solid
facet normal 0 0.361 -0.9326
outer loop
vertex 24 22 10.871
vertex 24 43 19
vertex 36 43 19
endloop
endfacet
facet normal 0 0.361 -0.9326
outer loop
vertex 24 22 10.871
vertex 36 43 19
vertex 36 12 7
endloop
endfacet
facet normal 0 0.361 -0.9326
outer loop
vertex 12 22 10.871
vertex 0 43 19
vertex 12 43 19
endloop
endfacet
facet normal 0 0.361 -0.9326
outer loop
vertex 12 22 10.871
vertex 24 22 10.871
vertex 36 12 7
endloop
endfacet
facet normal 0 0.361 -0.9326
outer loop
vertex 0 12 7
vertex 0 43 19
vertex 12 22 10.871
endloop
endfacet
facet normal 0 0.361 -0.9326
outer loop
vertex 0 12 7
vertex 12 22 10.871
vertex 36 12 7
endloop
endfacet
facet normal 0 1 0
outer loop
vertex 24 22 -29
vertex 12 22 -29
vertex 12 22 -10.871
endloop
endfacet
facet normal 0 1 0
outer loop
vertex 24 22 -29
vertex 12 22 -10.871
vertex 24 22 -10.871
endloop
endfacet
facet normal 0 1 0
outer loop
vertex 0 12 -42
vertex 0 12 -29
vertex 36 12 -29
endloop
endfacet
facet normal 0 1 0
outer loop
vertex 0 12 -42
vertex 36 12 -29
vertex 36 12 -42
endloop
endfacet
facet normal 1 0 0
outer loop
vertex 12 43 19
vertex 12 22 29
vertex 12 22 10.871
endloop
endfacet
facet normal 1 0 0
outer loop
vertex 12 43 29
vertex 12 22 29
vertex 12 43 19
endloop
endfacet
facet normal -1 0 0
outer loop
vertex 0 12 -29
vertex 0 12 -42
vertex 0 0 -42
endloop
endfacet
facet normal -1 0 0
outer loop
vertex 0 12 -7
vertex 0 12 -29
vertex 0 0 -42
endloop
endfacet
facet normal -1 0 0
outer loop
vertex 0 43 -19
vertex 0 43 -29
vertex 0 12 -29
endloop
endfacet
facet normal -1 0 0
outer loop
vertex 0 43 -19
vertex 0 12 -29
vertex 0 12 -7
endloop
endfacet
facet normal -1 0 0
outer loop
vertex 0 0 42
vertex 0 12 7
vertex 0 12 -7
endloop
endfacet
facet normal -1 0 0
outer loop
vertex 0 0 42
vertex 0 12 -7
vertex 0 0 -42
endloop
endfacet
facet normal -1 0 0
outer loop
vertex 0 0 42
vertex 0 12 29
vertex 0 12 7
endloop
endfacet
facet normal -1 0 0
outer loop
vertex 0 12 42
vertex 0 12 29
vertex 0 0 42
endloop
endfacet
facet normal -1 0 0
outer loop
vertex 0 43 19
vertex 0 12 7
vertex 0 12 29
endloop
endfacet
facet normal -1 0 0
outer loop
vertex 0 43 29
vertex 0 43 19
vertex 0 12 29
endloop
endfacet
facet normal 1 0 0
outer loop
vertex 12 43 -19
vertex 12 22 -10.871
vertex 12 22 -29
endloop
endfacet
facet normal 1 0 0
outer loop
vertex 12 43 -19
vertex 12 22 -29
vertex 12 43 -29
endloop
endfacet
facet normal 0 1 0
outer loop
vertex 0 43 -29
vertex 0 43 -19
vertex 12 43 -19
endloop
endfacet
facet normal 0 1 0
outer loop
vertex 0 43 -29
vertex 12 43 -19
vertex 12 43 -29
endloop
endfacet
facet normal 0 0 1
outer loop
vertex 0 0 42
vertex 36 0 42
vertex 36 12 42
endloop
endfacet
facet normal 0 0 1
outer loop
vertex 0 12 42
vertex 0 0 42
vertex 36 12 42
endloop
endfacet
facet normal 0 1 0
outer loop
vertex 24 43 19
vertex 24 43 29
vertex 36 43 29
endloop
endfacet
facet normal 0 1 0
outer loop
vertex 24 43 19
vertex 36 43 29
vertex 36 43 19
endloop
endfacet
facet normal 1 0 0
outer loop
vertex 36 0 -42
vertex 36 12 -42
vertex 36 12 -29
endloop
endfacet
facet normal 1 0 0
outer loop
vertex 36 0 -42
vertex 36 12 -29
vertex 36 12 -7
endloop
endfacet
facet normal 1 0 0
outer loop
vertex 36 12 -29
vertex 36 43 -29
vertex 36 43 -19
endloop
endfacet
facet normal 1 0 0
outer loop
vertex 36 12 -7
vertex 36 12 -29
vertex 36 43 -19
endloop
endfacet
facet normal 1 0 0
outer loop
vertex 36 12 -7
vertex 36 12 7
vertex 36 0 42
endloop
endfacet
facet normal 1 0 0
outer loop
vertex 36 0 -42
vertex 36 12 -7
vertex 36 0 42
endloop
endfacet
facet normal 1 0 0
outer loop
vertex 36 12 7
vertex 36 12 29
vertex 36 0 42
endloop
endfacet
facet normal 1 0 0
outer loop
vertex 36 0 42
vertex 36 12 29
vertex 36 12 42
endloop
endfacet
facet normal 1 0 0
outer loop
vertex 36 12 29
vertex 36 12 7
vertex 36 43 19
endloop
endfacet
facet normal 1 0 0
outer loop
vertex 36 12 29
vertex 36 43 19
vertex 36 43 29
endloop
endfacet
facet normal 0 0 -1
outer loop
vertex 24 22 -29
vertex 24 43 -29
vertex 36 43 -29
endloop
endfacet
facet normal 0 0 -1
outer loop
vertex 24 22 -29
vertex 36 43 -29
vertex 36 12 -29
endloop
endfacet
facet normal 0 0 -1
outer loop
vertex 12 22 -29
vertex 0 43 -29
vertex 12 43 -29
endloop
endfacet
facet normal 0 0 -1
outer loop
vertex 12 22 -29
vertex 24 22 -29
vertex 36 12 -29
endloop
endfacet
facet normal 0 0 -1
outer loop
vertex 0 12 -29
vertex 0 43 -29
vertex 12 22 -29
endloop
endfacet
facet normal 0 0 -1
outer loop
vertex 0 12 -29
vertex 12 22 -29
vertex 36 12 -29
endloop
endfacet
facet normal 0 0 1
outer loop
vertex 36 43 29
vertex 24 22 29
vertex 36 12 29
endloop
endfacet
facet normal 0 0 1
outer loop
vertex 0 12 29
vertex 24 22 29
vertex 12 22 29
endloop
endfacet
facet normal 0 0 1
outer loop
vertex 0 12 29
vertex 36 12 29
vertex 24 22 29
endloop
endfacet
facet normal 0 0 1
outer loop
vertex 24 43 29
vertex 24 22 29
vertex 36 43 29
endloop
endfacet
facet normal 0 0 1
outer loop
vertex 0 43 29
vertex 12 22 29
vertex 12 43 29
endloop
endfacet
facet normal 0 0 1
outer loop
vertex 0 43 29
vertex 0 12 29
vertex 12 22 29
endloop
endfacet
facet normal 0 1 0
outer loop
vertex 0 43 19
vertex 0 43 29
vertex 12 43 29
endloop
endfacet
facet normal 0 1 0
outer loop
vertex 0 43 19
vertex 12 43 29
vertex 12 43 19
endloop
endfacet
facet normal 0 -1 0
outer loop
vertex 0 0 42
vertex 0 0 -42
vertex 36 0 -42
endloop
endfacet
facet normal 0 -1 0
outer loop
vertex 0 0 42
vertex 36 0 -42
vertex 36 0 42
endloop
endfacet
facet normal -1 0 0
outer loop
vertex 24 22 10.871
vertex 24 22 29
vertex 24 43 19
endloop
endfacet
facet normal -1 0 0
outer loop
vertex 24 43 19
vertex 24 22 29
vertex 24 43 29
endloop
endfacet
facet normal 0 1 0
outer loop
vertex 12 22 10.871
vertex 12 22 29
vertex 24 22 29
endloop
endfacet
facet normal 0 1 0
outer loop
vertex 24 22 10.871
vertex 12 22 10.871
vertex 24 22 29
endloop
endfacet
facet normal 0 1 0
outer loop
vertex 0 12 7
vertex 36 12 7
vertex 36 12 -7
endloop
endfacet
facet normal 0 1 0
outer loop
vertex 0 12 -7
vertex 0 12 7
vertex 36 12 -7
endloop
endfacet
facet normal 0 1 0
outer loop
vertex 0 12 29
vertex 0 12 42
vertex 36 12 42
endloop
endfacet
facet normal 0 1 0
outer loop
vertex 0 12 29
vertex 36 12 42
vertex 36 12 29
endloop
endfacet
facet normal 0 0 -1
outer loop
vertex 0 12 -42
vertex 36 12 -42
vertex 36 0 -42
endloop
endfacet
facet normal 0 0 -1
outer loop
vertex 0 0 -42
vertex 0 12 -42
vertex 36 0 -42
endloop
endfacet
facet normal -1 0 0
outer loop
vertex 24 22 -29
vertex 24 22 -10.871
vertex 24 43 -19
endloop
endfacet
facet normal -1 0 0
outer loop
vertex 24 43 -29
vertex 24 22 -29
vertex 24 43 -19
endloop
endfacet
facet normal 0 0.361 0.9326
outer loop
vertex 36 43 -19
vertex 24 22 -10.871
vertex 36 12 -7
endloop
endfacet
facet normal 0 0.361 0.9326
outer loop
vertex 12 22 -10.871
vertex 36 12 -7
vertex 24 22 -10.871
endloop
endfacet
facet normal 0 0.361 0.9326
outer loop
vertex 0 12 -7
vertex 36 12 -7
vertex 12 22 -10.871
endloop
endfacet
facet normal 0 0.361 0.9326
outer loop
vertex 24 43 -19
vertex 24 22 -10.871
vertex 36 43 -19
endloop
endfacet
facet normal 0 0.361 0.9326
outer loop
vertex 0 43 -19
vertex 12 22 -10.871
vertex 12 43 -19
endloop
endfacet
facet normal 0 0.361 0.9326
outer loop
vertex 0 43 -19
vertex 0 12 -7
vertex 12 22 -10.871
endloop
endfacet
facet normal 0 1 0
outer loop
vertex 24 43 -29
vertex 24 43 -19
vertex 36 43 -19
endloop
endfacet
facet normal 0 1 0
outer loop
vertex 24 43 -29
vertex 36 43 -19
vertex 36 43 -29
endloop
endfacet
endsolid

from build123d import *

# Parameters (mm, degrees)
SALIENTE_EXTRUIR1_DEPTH = 36
CROQUIS2_W              = 12
CROQUIS2_H              = 21
CORTAR_EXTRUIR1_DEPTH   = 91.47651629


with BuildPart() as part:
    # Croquis1 → Saliente-Extruir1 (new body)
    with BuildSketch(Plane(origin=(0, 0, 0), x_dir=(0, 0, -1), z_dir=(1, 0, 0))):
        Polygon((42, 0), (-42, 0), (-42, 12), (-29, 12), (-29, 43), (-19, 43), (-7, 12), (7, 12), (19, 43), (29, 43), (29, 12), (42, 12), align=None)
    extrude(amount=SALIENTE_EXTRUIR1_DEPTH)

    # Croquis2 → Cortar-Extruir1 (cut, through all)
    with BuildSketch(Plane.XY.offset(29)):
        with Locations((18, 32.5)):
            Rectangle(CROQUIS2_W, CROQUIS2_H)
    extrude(amount=-CORTAR_EXTRUIR1_DEPTH, mode=Mode.SUBTRACT)


solid = part.part
